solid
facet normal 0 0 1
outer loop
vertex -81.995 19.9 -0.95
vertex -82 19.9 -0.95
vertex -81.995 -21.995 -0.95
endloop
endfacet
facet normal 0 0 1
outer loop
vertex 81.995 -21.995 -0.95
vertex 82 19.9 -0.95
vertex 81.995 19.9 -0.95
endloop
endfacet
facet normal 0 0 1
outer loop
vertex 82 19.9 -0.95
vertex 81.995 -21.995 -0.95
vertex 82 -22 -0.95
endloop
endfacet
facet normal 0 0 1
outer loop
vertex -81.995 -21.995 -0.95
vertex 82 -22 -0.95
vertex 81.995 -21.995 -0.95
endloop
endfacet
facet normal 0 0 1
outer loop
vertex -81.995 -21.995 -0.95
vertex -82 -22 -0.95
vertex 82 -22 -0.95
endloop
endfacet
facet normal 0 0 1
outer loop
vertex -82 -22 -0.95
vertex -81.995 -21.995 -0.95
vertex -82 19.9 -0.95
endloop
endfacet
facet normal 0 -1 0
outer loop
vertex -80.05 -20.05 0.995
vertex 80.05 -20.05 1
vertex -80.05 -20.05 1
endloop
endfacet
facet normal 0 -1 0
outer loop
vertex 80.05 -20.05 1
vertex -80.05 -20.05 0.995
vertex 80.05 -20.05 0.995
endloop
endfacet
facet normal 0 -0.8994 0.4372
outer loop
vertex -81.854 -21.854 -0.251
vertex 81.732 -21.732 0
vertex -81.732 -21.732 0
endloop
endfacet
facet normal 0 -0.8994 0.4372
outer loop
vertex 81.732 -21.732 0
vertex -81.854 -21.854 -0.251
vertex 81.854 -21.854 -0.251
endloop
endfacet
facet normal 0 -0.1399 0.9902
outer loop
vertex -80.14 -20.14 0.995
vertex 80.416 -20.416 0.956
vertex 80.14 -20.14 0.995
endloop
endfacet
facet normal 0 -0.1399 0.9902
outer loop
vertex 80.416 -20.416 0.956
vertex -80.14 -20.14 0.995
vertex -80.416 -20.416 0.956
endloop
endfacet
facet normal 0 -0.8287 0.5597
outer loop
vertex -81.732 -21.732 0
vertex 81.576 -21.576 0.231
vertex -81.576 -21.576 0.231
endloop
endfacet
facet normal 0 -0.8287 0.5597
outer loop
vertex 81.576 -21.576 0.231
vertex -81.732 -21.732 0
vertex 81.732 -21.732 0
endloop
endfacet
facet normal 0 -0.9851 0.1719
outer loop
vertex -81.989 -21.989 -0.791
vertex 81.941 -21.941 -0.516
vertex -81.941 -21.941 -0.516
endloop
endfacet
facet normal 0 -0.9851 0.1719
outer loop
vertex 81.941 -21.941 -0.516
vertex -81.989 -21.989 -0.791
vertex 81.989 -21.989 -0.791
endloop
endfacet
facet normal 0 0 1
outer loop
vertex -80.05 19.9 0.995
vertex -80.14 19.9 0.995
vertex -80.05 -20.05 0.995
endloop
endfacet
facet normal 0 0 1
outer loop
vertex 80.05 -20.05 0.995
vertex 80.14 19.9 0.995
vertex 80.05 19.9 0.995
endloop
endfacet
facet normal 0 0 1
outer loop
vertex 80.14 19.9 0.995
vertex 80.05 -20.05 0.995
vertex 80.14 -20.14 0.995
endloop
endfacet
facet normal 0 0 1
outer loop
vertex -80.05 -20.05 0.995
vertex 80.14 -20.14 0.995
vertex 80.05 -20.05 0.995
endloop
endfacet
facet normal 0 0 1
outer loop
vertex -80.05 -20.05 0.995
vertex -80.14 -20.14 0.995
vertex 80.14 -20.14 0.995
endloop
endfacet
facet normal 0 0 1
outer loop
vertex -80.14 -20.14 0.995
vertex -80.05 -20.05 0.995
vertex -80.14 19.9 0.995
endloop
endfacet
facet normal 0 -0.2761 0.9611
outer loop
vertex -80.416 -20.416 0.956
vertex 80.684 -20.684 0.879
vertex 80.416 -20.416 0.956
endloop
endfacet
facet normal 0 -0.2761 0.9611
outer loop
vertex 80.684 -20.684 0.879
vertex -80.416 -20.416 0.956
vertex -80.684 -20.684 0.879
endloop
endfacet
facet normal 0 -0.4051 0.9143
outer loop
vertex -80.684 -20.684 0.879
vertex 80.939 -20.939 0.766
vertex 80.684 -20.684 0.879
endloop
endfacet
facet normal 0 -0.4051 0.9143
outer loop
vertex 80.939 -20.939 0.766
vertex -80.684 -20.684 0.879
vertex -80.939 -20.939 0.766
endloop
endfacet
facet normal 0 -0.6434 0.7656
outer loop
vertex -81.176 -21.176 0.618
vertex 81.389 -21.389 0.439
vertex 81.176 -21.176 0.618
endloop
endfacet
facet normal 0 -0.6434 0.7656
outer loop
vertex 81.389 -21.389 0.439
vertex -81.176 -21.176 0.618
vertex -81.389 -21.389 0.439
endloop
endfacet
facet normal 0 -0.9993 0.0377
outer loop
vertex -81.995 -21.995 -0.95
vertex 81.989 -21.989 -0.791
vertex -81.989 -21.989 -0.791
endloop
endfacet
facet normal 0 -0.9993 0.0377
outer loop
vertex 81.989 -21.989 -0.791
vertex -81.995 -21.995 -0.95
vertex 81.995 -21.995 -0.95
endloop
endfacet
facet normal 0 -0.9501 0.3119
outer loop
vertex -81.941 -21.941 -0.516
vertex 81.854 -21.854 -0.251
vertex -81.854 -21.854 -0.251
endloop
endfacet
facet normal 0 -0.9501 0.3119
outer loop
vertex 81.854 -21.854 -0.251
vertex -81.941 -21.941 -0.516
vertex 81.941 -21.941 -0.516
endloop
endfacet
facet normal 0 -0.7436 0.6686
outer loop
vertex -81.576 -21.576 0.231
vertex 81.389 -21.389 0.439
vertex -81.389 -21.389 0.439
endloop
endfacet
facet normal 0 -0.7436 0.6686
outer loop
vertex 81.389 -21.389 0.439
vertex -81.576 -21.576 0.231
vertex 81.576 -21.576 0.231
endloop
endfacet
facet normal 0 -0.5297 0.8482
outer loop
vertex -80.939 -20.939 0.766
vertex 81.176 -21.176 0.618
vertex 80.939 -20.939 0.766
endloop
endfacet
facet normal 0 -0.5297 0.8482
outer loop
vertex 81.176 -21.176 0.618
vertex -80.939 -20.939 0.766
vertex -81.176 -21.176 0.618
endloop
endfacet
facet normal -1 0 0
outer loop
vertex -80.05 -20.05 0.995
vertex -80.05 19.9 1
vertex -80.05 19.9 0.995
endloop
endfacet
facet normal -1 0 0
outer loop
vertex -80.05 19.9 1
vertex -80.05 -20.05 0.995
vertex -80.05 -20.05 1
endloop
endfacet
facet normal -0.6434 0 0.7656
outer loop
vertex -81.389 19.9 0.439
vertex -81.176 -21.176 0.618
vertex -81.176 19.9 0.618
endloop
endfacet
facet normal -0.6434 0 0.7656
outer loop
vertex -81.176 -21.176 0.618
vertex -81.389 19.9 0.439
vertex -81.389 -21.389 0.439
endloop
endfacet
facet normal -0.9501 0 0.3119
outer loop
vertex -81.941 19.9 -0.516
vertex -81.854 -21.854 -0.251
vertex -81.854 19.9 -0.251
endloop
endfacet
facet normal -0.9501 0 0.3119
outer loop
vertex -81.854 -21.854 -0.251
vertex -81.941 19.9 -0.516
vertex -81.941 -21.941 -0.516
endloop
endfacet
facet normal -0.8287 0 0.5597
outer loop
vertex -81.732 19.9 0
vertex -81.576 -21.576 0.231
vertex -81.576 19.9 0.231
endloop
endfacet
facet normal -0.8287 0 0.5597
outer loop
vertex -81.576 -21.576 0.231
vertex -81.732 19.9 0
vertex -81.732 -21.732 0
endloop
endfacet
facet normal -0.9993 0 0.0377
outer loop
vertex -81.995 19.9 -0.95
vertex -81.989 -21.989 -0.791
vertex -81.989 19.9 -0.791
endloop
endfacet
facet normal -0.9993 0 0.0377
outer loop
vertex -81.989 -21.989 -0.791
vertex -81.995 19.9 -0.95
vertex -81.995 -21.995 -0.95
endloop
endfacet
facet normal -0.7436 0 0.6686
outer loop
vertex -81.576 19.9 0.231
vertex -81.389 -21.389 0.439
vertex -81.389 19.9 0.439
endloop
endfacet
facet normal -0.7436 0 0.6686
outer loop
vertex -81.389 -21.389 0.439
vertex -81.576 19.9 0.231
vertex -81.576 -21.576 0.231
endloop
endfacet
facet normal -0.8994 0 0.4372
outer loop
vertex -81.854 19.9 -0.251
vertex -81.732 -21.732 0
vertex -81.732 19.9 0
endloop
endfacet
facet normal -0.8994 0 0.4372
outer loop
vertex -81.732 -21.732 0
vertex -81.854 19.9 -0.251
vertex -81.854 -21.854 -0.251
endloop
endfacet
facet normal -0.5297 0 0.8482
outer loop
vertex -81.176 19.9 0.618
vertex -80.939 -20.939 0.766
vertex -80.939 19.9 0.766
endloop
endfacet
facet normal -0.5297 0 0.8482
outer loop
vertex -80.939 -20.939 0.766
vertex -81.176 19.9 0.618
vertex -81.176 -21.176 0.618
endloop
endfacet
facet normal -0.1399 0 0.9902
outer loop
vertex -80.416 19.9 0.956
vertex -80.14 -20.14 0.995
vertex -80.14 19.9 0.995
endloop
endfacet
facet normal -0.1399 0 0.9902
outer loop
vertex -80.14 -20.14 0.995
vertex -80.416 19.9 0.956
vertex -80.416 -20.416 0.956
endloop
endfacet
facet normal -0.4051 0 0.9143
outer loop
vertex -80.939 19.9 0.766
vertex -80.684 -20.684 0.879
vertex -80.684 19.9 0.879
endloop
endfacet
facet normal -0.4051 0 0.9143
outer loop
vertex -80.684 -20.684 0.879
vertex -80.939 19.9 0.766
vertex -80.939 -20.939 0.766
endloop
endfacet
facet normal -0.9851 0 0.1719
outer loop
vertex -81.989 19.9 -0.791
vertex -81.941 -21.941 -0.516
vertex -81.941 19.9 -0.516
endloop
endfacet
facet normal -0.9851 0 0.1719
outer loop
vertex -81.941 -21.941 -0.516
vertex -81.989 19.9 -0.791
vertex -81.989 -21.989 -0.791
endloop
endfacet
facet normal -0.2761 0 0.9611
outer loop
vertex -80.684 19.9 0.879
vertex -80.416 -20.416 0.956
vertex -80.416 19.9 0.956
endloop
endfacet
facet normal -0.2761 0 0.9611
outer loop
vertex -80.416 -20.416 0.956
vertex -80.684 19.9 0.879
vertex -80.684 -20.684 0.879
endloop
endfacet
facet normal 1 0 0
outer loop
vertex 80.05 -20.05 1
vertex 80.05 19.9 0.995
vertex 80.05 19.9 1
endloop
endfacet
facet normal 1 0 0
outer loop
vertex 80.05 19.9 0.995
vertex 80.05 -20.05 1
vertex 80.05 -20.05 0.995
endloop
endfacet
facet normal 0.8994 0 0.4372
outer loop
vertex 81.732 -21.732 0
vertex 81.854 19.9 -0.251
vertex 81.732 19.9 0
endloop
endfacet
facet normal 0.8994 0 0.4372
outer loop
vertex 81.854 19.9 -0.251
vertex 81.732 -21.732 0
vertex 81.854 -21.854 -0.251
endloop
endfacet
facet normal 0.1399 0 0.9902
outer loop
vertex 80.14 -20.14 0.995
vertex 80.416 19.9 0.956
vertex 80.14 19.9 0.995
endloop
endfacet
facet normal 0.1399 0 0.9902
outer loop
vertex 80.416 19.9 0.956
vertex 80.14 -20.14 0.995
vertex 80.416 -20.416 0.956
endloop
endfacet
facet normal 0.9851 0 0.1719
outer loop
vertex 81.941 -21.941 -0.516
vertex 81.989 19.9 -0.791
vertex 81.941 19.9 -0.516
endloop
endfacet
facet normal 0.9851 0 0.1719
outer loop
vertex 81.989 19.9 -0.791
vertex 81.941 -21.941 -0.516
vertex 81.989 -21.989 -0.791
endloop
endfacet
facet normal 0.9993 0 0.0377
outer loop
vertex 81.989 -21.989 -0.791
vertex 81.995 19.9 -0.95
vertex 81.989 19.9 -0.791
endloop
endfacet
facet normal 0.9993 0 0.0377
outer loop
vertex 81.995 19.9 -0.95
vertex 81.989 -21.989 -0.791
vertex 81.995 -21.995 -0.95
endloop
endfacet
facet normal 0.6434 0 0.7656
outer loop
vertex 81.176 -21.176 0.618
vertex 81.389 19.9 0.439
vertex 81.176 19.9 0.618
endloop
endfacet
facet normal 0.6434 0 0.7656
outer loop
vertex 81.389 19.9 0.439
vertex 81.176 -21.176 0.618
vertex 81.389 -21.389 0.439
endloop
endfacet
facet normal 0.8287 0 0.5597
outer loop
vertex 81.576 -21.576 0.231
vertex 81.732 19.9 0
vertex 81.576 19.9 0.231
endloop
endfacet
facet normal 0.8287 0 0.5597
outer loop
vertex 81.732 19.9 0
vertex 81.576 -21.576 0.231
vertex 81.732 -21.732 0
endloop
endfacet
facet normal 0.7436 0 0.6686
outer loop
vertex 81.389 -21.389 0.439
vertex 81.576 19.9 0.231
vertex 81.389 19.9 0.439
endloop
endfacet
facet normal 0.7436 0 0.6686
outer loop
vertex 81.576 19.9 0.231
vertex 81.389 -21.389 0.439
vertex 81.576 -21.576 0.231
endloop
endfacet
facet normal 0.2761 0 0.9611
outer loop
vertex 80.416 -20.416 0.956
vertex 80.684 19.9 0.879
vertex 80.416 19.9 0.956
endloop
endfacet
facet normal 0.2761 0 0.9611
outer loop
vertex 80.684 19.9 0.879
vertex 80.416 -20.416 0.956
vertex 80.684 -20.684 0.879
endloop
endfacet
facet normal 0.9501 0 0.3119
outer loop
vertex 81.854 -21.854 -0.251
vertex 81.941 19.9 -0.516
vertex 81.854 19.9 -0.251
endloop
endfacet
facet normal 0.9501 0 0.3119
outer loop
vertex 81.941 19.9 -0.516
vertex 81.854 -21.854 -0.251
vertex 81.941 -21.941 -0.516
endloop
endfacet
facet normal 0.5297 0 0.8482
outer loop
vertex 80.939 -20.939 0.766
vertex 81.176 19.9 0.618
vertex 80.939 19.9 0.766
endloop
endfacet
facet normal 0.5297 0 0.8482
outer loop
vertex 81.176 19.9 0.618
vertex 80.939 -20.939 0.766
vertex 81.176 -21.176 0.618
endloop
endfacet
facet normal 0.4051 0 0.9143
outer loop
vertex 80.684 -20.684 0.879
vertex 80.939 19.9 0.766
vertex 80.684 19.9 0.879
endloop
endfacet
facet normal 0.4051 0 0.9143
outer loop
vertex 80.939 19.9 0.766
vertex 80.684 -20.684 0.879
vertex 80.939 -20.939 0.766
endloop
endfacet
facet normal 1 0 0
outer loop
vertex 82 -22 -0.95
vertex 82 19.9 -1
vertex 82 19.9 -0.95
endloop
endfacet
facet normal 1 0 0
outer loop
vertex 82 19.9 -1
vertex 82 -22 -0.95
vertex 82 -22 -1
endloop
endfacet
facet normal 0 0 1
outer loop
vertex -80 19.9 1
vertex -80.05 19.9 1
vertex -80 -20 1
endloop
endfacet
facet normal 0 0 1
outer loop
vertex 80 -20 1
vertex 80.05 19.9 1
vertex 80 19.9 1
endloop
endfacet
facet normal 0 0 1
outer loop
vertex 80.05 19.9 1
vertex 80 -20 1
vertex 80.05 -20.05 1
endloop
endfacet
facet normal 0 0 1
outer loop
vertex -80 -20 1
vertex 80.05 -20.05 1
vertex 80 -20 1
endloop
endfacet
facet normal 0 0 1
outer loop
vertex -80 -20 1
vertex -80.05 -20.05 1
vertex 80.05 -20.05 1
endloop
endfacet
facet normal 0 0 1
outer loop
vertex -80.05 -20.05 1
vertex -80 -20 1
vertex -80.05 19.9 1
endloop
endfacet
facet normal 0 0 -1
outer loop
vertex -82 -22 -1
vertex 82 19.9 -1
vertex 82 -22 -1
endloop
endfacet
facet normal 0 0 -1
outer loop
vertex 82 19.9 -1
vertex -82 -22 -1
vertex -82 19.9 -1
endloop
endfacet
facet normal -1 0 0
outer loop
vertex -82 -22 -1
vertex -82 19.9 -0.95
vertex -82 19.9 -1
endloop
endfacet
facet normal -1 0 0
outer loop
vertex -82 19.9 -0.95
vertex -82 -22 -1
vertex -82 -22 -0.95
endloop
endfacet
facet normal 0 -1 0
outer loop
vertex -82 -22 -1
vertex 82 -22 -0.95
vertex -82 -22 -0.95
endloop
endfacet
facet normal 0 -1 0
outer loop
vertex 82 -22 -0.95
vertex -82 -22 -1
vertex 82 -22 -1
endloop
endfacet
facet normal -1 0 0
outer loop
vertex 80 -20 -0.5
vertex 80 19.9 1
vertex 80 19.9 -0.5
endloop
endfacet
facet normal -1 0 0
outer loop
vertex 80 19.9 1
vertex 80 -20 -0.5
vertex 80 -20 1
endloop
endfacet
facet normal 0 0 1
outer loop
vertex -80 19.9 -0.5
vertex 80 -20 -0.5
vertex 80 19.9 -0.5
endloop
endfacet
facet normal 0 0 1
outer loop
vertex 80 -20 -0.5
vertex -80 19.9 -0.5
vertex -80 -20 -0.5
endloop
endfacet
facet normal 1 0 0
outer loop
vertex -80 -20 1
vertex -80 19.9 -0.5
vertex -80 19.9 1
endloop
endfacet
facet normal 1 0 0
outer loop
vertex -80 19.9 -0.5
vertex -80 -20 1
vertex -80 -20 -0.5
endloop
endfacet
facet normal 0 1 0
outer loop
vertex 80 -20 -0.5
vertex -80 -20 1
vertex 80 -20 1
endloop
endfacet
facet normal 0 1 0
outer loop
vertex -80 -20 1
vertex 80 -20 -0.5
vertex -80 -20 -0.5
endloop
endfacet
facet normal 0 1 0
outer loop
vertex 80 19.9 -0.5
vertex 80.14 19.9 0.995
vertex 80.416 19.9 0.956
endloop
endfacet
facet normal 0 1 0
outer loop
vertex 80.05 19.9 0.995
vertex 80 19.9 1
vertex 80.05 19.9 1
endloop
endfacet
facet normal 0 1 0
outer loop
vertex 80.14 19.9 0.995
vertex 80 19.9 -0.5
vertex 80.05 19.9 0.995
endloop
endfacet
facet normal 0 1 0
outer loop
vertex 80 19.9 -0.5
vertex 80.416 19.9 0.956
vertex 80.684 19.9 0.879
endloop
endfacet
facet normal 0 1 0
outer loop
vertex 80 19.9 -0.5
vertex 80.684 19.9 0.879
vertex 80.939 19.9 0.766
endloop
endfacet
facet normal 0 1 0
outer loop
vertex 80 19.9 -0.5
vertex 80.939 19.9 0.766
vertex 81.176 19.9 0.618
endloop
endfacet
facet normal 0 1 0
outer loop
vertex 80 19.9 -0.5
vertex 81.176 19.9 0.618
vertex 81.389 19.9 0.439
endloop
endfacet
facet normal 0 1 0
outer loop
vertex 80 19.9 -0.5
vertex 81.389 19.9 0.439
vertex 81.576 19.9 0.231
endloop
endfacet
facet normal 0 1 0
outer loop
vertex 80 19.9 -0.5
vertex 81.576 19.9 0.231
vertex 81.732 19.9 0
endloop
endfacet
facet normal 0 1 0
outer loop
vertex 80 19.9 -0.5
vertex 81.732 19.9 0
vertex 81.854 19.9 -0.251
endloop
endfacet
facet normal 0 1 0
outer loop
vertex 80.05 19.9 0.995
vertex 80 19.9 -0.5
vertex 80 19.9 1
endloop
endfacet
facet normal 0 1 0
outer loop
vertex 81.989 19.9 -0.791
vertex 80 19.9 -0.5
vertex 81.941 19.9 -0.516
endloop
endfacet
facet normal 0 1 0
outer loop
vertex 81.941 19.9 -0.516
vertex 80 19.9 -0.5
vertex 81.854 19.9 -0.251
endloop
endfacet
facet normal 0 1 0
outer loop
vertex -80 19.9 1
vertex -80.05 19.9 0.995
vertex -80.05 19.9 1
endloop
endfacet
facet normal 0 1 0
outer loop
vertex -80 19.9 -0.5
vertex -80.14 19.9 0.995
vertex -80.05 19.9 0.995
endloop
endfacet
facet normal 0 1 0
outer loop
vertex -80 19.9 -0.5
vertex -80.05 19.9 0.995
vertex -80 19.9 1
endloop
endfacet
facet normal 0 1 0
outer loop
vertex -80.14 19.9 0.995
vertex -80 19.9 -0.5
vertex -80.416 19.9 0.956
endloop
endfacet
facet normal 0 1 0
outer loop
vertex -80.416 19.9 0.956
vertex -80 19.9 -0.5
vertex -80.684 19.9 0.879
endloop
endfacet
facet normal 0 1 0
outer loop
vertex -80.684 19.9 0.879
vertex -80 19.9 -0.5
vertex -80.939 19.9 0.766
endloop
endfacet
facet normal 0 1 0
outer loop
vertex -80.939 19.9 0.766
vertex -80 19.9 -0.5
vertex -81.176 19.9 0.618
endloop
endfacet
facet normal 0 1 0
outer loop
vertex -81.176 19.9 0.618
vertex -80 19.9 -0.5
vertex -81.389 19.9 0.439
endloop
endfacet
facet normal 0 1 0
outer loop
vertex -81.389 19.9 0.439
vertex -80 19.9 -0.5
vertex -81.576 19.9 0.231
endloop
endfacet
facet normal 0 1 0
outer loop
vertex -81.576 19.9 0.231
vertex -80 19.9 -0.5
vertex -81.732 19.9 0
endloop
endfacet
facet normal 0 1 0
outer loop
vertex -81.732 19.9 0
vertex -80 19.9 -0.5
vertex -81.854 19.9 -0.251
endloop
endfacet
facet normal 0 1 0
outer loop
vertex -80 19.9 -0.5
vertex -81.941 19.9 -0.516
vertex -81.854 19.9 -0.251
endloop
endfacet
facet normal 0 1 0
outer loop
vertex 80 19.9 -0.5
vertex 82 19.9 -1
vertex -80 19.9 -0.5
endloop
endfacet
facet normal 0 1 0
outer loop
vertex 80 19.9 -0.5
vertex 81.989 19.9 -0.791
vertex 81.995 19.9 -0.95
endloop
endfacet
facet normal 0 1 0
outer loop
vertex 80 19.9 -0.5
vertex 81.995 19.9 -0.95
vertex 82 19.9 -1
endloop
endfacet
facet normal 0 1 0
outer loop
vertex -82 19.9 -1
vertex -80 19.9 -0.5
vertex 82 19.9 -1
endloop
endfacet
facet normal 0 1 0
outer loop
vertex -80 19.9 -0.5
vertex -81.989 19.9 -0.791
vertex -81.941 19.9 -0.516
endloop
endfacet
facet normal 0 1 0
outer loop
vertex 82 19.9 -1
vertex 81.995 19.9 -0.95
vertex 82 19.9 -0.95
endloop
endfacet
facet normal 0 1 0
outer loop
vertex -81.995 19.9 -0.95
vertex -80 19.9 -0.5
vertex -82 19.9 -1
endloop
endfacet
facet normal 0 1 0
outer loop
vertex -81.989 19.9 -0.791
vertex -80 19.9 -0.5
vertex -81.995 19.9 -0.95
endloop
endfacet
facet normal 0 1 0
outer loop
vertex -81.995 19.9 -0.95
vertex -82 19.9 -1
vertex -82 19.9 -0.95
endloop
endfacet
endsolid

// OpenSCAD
// Length
length = 160;

// Width
width = 40;

// Height
height = 2;

// Thickness of bottom
bottom_thickness = 0.5;

// Border width
border = 2;

// Open front
cut_front = true;



pad = 0.1;	// Padding to maintain manifold
round_r = 2;	// Radius of round
smooth = 45;	// Number of facets of rounding cylinder

// To fix the corners cut the main cube with smaller cubes with spheres removed

difference() {
    rounded_box(length + border*2, width + border*2, height, pad);
    
    translate([0, 0, bottom_thickness]) {
        cube([length, width, height], center = true);
    }
    
    if(cut_front)
        translate([0, width/2+border/2-pad/2, 0])
            cube([length+border*2, border+pad, height+border], center = true);
}





module rounded_box(box_l, box_w, box_h, pad) {
   
    difference() {
        cube([box_l, box_w, box_h], center = true);
    
        translate([0, -box_w/2+round_r, box_h/2-round_r]) {
            difference() {
                translate([0,-round_r-pad,round_r+pad])
                    cube([box_l+2*pad, round_r*2+pad, round_r*2+pad], center = true);
                rotate(a=[0,90,0])
                    cylinder(box_l+4*pad,round_r,round_r,center=true,$fn=smooth);
            }
        }
        translate([0, box_w/2-round_r, box_h/2-round_r]) {
            difference() {
                translate([0,round_r+pad,round_r+pad])
                    cube([box_l+2*pad, round_r*2+pad, round_r*2+pad], center = true);
                rotate(a=[0,90,0])
                    cylinder(box_l+4*pad,round_r,round_r,center=true,$fn=smooth);
            }
        }
    
        translate([-box_l/2+round_r, 0, box_h/2-round_r]) {
            difference() {
                translate([-round_r-pad, 0, round_r+pad])
                    cube([round_r*2+pad, box_w+2*pad, round_r*2+pad], center = true);
                rotate(a=[0,90,90])
                    cylinder(box_w+4*pad,round_r,round_r,center=true,$fn=smooth);
            }
        }
        translate([box_l/2-round_r, 0, box_h/2-round_r]) {
            difference() {
                translate([round_r+pad, 0, round_r+pad])
                    cube([round_r*2+pad, box_w+2*pad, round_r*2+pad], center = true);
                rotate(a=[0,90,90])
                    cylinder(box_w+4*pad,round_r,round_r,center=true,$fn=smooth);
            }
        }
    }
}
